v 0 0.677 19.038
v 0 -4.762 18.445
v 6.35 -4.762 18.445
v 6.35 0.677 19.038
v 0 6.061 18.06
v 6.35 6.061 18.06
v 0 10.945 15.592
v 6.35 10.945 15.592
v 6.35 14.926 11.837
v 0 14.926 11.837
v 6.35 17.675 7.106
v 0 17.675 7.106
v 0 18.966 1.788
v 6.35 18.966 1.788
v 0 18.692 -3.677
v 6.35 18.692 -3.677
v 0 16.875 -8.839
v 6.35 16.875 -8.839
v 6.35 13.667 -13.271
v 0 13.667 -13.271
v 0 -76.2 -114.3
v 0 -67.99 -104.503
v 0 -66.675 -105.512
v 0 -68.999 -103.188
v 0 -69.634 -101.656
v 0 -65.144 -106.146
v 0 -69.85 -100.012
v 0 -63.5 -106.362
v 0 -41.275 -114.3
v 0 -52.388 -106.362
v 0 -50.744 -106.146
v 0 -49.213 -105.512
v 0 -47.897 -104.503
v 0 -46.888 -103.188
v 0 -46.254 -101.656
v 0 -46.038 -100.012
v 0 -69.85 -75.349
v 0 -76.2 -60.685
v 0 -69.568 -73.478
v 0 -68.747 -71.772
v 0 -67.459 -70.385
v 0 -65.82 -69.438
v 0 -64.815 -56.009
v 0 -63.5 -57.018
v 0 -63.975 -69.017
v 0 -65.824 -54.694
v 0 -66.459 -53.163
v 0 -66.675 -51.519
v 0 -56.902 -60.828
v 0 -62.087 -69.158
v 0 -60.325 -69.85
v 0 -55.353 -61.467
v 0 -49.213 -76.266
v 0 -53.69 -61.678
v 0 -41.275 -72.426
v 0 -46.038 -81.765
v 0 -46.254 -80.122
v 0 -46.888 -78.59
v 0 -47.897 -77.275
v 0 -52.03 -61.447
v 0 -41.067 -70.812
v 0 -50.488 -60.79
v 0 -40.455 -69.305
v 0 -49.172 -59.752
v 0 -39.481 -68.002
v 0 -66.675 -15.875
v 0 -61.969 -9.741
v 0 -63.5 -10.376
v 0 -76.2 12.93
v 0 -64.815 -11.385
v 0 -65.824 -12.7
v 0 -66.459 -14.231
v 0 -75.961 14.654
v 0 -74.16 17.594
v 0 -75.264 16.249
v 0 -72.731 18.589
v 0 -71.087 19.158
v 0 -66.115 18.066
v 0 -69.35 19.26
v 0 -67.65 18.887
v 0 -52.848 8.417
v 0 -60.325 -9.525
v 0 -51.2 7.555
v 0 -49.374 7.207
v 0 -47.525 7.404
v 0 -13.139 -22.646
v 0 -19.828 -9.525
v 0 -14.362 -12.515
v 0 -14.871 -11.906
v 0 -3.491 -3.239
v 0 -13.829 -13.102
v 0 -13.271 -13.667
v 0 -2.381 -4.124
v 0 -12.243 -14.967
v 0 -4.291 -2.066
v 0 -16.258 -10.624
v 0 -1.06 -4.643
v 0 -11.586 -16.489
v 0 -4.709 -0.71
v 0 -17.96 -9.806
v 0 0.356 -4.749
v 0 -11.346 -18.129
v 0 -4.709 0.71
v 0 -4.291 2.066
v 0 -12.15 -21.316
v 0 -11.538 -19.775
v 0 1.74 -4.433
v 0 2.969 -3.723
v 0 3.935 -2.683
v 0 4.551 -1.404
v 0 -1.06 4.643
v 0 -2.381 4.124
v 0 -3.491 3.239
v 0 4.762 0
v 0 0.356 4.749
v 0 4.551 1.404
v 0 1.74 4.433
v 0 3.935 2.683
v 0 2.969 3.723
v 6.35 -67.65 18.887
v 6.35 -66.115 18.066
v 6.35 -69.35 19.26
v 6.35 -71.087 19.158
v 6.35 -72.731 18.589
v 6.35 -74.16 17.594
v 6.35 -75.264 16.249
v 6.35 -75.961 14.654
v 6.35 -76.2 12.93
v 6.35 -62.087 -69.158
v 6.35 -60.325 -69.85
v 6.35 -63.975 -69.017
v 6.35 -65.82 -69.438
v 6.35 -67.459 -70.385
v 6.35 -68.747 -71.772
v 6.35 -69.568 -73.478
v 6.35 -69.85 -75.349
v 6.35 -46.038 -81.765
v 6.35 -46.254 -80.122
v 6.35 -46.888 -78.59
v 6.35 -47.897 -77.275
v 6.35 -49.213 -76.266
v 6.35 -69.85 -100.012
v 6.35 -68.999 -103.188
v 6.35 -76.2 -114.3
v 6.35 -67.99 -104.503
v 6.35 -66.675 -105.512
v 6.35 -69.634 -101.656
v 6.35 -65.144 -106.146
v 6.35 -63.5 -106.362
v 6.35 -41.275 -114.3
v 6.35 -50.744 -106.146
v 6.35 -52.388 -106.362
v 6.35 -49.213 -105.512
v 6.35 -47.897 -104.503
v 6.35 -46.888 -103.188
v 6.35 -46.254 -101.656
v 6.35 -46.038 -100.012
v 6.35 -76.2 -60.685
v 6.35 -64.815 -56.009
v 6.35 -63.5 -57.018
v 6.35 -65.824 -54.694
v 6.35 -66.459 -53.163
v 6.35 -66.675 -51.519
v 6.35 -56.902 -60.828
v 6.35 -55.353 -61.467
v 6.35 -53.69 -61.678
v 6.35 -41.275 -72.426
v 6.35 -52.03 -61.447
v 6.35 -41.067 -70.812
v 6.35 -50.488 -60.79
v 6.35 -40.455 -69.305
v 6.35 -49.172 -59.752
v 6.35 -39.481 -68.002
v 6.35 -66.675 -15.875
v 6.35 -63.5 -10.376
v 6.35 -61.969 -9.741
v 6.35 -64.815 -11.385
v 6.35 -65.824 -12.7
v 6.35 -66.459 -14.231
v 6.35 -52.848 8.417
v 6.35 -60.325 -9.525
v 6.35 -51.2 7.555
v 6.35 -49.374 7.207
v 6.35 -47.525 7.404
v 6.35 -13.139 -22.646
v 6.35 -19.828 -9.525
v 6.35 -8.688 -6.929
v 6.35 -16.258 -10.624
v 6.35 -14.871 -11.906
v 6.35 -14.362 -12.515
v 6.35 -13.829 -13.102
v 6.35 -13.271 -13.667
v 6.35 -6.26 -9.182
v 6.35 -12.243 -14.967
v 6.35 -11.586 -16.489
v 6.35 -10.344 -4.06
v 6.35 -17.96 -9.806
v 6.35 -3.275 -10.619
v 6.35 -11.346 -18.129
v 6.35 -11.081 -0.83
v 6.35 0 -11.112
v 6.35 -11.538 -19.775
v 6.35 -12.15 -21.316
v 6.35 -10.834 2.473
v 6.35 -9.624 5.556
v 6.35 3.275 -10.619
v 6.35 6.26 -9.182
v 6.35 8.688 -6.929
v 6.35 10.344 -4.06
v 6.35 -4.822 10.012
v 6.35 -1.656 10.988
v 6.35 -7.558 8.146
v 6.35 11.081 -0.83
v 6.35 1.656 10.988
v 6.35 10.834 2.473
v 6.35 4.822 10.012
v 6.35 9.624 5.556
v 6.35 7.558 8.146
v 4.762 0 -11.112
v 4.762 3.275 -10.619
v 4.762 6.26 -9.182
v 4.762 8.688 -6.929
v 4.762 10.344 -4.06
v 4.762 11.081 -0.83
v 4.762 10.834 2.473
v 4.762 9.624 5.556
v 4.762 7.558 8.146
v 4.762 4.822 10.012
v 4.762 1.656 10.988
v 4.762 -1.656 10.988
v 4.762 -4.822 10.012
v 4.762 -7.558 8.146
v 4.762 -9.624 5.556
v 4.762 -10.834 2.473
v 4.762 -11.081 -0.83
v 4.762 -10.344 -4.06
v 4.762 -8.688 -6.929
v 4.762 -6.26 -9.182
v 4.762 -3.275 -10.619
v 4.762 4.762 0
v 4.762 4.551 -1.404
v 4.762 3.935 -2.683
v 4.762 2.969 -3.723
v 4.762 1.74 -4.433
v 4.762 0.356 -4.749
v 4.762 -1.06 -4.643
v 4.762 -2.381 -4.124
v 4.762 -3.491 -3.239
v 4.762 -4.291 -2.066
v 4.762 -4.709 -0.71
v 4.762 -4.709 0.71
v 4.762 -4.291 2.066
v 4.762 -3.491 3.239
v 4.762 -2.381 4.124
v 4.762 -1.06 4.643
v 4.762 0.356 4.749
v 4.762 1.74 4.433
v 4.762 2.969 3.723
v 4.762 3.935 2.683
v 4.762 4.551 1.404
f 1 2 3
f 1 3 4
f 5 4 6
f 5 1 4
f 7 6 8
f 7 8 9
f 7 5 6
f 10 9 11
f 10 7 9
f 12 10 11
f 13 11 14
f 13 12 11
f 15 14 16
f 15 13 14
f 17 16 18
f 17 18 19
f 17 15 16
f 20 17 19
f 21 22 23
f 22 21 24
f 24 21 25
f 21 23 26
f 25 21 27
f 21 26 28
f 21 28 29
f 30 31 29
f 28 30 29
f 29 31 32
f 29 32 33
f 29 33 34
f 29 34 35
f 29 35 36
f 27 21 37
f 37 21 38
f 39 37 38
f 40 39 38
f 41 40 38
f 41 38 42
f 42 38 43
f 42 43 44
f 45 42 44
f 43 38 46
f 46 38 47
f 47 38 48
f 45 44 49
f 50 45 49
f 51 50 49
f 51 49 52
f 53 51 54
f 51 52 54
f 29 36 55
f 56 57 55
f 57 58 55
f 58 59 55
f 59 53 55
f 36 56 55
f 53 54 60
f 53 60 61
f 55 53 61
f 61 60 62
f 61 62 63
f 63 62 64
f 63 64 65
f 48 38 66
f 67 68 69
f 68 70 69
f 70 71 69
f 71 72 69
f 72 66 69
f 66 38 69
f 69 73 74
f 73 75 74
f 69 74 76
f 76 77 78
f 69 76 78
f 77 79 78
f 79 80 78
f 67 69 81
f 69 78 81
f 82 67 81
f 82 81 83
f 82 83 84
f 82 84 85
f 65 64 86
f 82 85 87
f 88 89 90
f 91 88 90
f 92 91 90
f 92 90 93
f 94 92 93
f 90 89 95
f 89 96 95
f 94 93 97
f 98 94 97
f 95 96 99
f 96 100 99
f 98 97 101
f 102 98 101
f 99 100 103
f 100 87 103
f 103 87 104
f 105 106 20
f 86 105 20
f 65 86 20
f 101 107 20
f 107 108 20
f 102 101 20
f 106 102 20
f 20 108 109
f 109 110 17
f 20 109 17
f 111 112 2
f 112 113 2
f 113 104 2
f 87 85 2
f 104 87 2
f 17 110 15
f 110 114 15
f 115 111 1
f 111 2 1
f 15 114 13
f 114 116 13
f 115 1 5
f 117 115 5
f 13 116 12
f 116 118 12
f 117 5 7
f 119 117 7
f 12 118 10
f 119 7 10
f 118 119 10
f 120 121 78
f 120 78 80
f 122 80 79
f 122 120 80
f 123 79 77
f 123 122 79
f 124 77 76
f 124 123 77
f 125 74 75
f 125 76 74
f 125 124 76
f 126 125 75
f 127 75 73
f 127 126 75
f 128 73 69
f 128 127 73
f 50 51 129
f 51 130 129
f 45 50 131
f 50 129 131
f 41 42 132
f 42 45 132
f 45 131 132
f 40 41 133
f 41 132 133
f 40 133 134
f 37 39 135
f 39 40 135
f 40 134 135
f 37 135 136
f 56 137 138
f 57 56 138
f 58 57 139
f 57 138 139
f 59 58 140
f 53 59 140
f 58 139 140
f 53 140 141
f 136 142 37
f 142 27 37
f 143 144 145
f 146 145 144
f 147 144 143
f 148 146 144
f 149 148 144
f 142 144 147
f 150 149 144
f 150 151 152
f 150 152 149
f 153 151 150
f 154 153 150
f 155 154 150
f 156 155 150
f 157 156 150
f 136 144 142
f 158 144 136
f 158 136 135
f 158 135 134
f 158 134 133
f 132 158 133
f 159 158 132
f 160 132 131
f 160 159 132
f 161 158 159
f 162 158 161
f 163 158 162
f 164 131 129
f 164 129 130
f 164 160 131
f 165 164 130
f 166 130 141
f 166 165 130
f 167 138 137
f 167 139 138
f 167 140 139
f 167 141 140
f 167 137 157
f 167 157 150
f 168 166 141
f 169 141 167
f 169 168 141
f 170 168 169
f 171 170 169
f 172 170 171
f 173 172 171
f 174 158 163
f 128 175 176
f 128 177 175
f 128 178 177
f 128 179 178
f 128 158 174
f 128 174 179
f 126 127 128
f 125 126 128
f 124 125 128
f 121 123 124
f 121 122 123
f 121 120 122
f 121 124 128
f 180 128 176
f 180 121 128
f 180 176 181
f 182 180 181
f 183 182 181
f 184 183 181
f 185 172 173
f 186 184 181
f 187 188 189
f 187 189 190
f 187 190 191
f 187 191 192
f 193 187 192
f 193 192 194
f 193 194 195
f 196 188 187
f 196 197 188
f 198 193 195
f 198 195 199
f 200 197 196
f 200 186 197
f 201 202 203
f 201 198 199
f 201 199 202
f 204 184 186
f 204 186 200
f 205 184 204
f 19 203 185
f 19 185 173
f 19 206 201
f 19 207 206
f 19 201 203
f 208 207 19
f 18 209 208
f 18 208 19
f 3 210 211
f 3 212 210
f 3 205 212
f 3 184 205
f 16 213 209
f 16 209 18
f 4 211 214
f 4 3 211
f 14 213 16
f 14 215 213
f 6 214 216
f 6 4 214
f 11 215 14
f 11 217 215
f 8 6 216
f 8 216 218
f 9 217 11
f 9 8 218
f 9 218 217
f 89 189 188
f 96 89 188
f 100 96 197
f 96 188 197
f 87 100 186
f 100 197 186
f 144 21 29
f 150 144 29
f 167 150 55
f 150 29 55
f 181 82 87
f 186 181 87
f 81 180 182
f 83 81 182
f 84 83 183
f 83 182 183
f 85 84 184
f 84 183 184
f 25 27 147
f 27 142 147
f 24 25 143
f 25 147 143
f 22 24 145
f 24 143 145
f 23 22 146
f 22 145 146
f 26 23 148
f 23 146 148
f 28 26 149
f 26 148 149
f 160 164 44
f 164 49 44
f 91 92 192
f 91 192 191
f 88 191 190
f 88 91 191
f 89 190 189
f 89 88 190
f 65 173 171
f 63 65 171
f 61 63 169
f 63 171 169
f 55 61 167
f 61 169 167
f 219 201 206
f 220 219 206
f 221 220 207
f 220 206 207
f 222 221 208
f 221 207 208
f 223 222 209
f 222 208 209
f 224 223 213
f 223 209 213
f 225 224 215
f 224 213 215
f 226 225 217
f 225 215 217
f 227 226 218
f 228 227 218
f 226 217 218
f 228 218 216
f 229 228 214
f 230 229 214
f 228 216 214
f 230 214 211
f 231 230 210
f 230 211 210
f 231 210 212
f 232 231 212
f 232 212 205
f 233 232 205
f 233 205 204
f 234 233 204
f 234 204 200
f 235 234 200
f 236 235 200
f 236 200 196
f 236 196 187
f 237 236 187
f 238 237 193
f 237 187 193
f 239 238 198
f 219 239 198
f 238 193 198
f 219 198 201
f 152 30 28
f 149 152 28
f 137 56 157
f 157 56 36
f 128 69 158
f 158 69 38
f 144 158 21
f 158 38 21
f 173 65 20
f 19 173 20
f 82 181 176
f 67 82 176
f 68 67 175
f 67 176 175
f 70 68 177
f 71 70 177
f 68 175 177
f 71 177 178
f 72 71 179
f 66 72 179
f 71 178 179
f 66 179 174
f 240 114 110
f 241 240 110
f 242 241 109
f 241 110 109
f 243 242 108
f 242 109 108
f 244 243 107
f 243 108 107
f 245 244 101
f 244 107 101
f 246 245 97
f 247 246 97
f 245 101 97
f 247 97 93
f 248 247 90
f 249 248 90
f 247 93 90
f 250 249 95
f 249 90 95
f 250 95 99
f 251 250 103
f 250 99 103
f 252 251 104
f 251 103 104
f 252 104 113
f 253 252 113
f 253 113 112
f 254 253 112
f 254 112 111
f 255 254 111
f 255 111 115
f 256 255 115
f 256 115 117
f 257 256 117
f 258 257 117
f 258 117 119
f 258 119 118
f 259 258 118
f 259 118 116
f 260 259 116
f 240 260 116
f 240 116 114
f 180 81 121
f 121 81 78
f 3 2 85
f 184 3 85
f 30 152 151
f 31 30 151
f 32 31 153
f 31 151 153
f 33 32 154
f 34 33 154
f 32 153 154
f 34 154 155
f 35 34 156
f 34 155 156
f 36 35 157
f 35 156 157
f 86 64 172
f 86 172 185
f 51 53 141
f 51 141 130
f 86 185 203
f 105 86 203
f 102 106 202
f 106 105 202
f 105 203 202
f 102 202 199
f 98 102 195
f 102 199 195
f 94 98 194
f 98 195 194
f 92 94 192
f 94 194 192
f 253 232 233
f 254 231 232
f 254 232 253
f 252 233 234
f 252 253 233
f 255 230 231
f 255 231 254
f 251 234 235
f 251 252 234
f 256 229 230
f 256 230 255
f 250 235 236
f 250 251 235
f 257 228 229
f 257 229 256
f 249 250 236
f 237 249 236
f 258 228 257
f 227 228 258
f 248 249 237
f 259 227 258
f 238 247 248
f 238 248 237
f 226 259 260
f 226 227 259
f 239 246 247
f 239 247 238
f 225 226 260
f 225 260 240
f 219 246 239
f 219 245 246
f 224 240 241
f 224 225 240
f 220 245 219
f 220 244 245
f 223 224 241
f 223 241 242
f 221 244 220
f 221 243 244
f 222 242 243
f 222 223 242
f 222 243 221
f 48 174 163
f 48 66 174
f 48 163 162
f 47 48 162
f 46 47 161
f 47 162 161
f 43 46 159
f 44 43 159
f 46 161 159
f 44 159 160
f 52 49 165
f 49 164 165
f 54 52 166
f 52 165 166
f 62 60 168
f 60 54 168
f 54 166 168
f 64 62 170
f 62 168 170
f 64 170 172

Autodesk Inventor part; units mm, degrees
ref_plane "YZ Plane" through (0, 0, 0) normal (1, 0, 0) x (0, 1, 0)
ref_plane "XZ Plane" through (0, 0, 0) normal (0, 1, 0) x (-1, 0, 0)
ref_plane "XY Plane" through (0, 0, 0) normal (0, 0, 1) x (1, 0, 0)
sketch "Sketch1" plane through (0, 0, 0) normal (1, 0, 0) x (0, 1, 0)
  circle A0 centre (0, 0) radius 4.7625
  line L0 (0, 0) -> (-76.2, 0) construction
  circle A1 centre (0, 0) radius 19.05
  line L1 (-4.7625, 18.4451) -> (-76.2, 0)
  line L2 (-76.2, 0) -> (-76.2, -114.3)
  circle A2 centre (0, 0) radius 76.2 construction
  line L3 (-76.2, -114.3) -> (-41.275, -114.3)
  line L4 (-41.275, -114.3) -> (-41.275, -69.85)
  line L5 (-41.275, -69.85) -> (-76.2, -49.686)
  line L6 (-41.275, -69.85) -> (13.6667, -13.2712)
  line L7 (-52.6181, -63.301) -> (-7.9567, -17.3088)
  line L8 (-66.675, -9.525) -> (-66.675, -55.1853)
  line L9 (-46.0375, -78.0989) -> (-76.2, -60.6846)
  line L10 (-46.0375, -78.0989) -> (-46.0375, -106.3625)
  line L11 (-46.0375, -106.3625) -> (-69.85, -106.3625)
  line L12 (-69.85, -106.3625) -> (-69.85, -64.3507)
  line L13 (-66.675, -9.525) -> (-64.7847, -9.525)
  line L14 (-64.7847, -9.525) -> (-16.4978, -9.525)
  line L15 (-76.2, 0) -> (-41.275, 0)
  line L16 (-41.275, 0) -> (-41.275, 25.4) construction
  line L17 (-41.275, 25.4) -> (-76.2, 25.4) construction
  line L18 (-76.2, 25.4) -> (-76.2, 0)
  line L19 (-41.275, 0) -> (-76.2, 25.4)
  point P0 (-50.4255, 6.6549)
  dimension "d0" = 9.525
  dimension "d1" = 76.2
  dimension "d2" = 38.1
  dimension "d3" = 114.3
  dimension "d4" = 152.4
  dimension "d5" = 34.925
  dimension "d6" = 44.45
  dimension "d7" = 60
  dimension "d9" = 12.7
  dimension "d10" = 9.525
  dimension "d11" = 9.525
  dimension "d12" = 7.9375
  dimension "d13" = 6.35
  dimension "d14" = 4.7625
  dimension "d17" = 9.525
  dimension "d19" = 34.925
  dimension "d20" = 25.4
extrude "Extrusion1" add sketch "Sketch1" along normal blind 6.35 contours A1 | A1 L14 L13 L8 L5 L2 L15 L19 L1 | L6 L5 L7 A1 | L19 L15 L1 | L1 L18 L19 | L4 L3 L2 L5
fillet "Fillet1" radius 6.35 10 edges at (3.175, -7.9567, -17.3088) (3.175, -16.4978, -9.525) (3.175, -52.6181, -63.301) (3.175, -66.675, -9.525) (3.175, -66.675, -55.1853) (3.175, -69.85, -64.3507) (3.175, -46.0375, -78.0989) (3.175, -46.0375, -106.3625) (3.175, -69.85, -106.3625) (3.175, -41.275, -69.85)
fillet "Fillet2" radius 6.35 2 edges at (3.175, -76.2, 25.4) (3.175, -50.4255, 6.6549)
sketch "Sketch2" plane through (6.35, 0, 0) normal (1, 0, 0) x (0, 0, -1)
  circle A0 centre (0, 0) radius 4.7625 projected
  circle A1 centre (0, 0) radius 11.1125
  dimension "d24" = 22.225
extrude "Extrusion2" cut sketch "Sketch2" against normal blind 1.5875 contours A0 | A1
equation "\"d9\" = d8"
equation "\"d8\" = 12.7"
properties part number "Upright" material "Aluminum 6061"
